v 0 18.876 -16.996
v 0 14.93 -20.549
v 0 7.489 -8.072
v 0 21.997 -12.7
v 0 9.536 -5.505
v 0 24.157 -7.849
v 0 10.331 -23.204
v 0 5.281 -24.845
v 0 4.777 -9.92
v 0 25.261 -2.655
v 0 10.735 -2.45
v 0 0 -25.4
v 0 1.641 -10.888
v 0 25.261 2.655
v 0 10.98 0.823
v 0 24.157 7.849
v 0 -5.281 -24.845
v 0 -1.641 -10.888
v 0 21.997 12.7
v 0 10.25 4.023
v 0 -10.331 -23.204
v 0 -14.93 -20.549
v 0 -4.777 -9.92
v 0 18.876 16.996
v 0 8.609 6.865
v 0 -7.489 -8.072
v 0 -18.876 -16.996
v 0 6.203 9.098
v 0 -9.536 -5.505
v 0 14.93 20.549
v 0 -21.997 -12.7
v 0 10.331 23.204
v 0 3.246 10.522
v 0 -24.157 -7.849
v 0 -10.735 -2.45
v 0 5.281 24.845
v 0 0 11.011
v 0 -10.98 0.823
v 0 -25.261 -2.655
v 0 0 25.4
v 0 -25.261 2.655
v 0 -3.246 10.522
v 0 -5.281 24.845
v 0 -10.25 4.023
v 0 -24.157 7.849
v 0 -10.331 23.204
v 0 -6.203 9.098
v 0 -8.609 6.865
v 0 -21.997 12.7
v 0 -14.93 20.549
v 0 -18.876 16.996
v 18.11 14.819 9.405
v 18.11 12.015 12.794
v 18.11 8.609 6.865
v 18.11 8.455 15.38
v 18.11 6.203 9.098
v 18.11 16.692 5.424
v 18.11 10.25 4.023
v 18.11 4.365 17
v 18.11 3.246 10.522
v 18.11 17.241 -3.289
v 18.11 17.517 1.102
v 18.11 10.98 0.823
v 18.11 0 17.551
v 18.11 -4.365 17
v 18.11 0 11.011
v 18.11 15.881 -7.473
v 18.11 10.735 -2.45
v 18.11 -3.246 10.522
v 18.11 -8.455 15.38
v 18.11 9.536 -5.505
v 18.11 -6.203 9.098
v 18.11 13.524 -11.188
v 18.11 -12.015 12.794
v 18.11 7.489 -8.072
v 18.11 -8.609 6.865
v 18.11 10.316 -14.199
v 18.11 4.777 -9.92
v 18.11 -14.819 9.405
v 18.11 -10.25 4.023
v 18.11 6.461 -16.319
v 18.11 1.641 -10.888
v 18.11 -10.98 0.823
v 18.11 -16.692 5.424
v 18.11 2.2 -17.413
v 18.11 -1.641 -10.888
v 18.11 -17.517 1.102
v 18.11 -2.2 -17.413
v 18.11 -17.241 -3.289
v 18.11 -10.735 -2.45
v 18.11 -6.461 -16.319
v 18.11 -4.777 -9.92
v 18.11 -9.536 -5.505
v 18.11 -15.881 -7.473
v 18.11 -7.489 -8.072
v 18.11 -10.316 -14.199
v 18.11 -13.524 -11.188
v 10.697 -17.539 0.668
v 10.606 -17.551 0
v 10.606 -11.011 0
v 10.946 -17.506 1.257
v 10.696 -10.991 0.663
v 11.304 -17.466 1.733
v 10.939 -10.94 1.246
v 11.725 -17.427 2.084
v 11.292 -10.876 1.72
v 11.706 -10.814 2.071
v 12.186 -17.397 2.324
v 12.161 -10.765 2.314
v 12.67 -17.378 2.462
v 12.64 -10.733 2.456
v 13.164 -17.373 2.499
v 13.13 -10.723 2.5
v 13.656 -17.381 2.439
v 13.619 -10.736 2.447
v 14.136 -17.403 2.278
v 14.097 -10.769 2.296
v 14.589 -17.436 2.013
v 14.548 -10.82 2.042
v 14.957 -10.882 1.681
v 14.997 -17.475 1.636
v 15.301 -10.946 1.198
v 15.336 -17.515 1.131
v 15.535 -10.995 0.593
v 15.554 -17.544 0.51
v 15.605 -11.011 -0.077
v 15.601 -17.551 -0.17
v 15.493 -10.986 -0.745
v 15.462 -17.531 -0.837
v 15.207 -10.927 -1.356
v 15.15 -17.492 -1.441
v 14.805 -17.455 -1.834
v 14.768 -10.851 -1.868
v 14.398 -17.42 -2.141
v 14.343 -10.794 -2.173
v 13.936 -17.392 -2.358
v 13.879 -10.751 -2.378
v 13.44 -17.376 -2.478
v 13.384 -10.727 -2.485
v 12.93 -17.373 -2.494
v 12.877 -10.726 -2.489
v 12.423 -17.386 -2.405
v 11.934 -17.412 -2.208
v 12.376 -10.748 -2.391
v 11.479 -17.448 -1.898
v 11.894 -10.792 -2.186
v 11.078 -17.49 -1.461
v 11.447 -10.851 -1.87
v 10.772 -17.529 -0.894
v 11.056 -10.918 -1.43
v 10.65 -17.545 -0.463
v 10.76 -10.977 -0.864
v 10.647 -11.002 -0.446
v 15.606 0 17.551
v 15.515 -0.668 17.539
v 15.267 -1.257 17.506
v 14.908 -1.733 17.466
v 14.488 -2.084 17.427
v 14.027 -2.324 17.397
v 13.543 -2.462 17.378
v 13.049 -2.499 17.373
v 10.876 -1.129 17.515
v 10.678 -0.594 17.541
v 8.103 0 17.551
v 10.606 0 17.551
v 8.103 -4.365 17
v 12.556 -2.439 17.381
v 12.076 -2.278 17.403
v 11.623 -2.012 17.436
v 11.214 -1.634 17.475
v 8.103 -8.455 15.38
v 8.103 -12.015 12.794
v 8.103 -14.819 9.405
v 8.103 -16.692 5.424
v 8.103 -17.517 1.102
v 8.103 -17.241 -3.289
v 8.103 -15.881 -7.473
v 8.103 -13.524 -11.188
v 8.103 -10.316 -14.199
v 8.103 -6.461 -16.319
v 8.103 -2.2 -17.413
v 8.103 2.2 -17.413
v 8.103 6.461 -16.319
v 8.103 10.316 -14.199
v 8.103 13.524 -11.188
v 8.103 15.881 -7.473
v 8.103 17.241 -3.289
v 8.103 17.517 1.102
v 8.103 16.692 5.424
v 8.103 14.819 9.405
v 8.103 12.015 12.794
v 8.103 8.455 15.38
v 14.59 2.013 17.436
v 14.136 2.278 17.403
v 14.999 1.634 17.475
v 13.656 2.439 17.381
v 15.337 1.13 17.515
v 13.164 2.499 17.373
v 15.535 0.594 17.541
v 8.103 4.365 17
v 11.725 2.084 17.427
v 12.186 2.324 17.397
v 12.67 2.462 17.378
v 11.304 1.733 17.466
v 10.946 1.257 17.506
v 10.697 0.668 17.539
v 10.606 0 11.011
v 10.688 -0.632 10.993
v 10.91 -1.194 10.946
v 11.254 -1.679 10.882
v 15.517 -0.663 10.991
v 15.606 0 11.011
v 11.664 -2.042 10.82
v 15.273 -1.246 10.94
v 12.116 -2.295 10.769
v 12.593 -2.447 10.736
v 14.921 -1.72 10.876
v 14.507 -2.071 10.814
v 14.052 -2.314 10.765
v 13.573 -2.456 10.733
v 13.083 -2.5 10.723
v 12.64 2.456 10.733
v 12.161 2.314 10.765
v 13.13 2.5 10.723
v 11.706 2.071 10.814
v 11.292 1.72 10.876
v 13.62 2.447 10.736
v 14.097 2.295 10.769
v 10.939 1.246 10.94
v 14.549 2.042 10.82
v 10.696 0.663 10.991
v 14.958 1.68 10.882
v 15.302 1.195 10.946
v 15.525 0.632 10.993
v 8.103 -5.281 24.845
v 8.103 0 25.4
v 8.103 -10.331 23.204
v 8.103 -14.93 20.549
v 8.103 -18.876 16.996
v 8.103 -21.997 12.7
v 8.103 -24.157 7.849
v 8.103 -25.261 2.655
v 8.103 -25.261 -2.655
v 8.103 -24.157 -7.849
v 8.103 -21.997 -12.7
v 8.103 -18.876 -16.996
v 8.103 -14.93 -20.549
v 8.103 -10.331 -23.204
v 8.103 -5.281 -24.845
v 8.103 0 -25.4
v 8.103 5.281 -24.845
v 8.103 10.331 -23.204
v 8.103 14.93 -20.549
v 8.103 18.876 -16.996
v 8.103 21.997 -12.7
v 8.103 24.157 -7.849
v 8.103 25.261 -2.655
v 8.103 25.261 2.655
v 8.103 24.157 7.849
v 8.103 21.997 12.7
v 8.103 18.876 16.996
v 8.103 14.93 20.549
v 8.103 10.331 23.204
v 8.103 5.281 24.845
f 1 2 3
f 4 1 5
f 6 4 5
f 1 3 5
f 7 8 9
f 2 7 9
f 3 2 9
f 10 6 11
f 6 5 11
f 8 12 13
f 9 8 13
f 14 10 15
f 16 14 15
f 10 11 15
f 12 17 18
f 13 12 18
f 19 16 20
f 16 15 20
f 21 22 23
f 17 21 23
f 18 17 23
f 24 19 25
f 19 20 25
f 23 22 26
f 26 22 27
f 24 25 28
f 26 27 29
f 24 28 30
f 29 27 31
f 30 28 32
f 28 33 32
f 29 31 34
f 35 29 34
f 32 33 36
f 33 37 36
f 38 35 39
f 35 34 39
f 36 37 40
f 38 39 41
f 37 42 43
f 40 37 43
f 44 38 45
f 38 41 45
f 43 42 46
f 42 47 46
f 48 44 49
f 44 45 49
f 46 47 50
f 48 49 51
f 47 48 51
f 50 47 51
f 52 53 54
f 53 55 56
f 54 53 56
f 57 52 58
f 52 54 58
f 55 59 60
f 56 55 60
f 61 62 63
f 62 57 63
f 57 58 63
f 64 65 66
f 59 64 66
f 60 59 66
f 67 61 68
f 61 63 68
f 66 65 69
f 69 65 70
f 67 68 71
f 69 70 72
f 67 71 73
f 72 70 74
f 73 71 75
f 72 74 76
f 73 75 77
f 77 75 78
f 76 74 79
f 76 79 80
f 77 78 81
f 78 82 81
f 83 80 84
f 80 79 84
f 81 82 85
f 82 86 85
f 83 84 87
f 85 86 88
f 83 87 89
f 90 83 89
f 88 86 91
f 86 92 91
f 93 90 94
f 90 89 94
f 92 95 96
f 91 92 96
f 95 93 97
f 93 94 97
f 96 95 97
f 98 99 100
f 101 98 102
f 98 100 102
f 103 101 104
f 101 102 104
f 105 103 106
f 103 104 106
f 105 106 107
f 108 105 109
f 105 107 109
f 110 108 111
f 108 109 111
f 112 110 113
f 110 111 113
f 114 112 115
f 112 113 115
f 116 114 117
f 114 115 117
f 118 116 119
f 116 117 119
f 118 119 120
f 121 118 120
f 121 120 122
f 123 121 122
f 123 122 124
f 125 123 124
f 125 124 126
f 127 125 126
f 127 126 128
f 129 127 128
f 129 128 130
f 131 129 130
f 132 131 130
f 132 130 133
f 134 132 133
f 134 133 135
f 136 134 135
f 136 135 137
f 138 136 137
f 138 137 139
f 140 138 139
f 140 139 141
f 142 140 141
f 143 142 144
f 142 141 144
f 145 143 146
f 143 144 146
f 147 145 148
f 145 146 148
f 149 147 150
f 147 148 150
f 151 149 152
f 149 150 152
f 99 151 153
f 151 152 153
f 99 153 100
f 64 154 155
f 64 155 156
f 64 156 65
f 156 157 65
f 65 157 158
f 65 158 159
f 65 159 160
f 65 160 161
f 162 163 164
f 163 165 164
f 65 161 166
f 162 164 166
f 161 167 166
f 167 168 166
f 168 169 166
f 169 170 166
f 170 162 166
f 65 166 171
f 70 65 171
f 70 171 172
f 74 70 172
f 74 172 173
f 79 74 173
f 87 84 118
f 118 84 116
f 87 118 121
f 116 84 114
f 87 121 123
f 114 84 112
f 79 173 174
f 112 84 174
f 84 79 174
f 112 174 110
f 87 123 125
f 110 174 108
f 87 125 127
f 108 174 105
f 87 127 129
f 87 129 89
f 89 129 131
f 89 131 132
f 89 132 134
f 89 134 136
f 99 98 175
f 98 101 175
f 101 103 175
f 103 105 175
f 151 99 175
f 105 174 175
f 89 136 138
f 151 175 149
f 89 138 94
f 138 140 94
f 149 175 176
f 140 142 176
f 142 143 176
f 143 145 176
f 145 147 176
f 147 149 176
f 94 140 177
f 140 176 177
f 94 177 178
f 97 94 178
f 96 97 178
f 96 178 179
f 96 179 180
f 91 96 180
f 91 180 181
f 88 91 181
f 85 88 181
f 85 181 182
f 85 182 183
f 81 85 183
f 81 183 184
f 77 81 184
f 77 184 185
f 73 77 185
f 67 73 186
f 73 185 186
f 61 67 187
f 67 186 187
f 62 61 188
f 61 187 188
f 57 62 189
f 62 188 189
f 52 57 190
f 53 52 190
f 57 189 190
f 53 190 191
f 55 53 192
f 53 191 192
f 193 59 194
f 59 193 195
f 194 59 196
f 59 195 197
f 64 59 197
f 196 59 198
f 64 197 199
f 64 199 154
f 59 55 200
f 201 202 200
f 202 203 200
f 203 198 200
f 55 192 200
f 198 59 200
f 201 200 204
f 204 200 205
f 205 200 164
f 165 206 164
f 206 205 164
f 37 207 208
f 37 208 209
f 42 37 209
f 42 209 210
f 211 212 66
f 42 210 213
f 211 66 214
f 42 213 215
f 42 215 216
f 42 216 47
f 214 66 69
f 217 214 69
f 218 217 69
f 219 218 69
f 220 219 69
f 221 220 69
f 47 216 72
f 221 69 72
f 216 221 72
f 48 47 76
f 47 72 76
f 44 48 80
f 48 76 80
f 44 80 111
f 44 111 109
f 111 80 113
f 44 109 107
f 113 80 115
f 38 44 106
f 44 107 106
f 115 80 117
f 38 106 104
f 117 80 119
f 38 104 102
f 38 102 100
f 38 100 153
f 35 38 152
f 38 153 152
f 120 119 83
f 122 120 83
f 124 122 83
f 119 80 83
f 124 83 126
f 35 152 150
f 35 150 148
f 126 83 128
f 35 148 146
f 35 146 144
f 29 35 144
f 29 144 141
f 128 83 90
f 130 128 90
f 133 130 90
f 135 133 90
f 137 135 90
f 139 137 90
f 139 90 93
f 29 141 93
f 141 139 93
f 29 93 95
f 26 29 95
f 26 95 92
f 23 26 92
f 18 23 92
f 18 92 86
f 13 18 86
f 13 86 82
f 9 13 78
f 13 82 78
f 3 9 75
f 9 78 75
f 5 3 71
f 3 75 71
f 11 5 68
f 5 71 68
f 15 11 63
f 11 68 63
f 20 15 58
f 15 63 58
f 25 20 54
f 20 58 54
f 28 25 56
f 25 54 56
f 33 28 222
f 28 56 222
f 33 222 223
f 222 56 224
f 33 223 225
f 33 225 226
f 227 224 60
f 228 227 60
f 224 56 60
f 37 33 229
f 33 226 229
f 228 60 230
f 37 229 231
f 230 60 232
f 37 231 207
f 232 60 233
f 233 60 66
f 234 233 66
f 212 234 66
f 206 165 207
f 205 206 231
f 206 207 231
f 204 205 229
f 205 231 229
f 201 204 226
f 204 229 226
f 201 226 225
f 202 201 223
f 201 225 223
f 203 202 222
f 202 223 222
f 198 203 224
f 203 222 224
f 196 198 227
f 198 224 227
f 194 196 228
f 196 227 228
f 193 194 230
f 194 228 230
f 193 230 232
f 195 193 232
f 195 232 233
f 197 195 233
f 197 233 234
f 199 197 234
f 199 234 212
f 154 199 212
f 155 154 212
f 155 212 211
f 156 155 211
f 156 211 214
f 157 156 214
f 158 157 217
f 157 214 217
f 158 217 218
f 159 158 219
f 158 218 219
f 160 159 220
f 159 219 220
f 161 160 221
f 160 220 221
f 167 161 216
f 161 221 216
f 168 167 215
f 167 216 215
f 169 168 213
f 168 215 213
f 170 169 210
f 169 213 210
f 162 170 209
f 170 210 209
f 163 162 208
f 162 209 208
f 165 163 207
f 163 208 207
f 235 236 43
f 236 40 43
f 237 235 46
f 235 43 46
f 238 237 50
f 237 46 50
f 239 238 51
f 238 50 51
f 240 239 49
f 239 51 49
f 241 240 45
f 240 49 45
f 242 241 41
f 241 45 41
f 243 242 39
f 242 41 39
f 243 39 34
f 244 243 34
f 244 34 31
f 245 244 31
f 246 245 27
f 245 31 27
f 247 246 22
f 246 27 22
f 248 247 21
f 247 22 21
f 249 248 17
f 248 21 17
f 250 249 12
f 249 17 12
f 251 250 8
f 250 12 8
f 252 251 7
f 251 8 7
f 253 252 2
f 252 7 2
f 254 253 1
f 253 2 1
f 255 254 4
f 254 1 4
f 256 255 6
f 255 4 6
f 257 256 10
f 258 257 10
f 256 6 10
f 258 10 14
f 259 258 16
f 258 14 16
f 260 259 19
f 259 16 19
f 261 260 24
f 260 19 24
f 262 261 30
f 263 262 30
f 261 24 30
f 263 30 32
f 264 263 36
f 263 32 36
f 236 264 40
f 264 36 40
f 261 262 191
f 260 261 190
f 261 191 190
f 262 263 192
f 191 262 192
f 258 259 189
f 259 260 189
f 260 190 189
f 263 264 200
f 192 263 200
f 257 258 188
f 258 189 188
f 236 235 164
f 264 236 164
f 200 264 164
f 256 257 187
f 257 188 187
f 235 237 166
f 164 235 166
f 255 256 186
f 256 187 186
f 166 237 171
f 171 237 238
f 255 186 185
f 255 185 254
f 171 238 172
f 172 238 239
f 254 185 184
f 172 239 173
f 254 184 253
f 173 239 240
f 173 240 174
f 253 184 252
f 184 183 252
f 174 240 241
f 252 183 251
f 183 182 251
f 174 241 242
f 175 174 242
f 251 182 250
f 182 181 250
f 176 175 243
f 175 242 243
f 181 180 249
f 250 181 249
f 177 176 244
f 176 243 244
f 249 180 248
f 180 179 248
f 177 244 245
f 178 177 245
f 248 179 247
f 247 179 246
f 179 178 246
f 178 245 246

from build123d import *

# Parameters (mm, degrees)
F4_D     = 5
F4_DEPTH = 11.06
F4_TIP   = 1.5021515476
F7_D     = 5
F7_DEPTH = 11.06
F7_TIP   = 1.5021515476


with BuildPart() as f1:
    # F0 (on Front) → F1 (revolve)
    with BuildSketch(Plane.XZ):
        Polygon((0, 25.4), (0, 11.0109), (18.1102, 11.0109), (18.1102, 17.5514), (8.1026, 17.5514), (8.1026, 25.4), align=None)
    revolve(axis=Axis((12.2365328816, 0, 0), (1, 0, 0)))

    # F4
    with Locations(Plane.XZ.offset(17.5514)):
        with Locations((13.1064, 0)):
            Hole(F4_D / 2, depth=F4_DEPTH)
            with Locations((0, 0, -(F4_DEPTH + F4_TIP / 2))):  # 118° drill point
                Cone(0, F4_D / 2, F4_TIP, mode=Mode.SUBTRACT)

    # F7
    with Locations(Plane.XY.offset(17.5514)):
        with Locations((13.1064, 0)):
            Hole(F7_D / 2, depth=F7_DEPTH)
            with Locations((0, 0, -(F7_DEPTH + F7_TIP / 2))):  # 118° drill point
                Cone(0, F7_D / 2, F7_TIP, mode=Mode.SUBTRACT)


solid = f1.part
